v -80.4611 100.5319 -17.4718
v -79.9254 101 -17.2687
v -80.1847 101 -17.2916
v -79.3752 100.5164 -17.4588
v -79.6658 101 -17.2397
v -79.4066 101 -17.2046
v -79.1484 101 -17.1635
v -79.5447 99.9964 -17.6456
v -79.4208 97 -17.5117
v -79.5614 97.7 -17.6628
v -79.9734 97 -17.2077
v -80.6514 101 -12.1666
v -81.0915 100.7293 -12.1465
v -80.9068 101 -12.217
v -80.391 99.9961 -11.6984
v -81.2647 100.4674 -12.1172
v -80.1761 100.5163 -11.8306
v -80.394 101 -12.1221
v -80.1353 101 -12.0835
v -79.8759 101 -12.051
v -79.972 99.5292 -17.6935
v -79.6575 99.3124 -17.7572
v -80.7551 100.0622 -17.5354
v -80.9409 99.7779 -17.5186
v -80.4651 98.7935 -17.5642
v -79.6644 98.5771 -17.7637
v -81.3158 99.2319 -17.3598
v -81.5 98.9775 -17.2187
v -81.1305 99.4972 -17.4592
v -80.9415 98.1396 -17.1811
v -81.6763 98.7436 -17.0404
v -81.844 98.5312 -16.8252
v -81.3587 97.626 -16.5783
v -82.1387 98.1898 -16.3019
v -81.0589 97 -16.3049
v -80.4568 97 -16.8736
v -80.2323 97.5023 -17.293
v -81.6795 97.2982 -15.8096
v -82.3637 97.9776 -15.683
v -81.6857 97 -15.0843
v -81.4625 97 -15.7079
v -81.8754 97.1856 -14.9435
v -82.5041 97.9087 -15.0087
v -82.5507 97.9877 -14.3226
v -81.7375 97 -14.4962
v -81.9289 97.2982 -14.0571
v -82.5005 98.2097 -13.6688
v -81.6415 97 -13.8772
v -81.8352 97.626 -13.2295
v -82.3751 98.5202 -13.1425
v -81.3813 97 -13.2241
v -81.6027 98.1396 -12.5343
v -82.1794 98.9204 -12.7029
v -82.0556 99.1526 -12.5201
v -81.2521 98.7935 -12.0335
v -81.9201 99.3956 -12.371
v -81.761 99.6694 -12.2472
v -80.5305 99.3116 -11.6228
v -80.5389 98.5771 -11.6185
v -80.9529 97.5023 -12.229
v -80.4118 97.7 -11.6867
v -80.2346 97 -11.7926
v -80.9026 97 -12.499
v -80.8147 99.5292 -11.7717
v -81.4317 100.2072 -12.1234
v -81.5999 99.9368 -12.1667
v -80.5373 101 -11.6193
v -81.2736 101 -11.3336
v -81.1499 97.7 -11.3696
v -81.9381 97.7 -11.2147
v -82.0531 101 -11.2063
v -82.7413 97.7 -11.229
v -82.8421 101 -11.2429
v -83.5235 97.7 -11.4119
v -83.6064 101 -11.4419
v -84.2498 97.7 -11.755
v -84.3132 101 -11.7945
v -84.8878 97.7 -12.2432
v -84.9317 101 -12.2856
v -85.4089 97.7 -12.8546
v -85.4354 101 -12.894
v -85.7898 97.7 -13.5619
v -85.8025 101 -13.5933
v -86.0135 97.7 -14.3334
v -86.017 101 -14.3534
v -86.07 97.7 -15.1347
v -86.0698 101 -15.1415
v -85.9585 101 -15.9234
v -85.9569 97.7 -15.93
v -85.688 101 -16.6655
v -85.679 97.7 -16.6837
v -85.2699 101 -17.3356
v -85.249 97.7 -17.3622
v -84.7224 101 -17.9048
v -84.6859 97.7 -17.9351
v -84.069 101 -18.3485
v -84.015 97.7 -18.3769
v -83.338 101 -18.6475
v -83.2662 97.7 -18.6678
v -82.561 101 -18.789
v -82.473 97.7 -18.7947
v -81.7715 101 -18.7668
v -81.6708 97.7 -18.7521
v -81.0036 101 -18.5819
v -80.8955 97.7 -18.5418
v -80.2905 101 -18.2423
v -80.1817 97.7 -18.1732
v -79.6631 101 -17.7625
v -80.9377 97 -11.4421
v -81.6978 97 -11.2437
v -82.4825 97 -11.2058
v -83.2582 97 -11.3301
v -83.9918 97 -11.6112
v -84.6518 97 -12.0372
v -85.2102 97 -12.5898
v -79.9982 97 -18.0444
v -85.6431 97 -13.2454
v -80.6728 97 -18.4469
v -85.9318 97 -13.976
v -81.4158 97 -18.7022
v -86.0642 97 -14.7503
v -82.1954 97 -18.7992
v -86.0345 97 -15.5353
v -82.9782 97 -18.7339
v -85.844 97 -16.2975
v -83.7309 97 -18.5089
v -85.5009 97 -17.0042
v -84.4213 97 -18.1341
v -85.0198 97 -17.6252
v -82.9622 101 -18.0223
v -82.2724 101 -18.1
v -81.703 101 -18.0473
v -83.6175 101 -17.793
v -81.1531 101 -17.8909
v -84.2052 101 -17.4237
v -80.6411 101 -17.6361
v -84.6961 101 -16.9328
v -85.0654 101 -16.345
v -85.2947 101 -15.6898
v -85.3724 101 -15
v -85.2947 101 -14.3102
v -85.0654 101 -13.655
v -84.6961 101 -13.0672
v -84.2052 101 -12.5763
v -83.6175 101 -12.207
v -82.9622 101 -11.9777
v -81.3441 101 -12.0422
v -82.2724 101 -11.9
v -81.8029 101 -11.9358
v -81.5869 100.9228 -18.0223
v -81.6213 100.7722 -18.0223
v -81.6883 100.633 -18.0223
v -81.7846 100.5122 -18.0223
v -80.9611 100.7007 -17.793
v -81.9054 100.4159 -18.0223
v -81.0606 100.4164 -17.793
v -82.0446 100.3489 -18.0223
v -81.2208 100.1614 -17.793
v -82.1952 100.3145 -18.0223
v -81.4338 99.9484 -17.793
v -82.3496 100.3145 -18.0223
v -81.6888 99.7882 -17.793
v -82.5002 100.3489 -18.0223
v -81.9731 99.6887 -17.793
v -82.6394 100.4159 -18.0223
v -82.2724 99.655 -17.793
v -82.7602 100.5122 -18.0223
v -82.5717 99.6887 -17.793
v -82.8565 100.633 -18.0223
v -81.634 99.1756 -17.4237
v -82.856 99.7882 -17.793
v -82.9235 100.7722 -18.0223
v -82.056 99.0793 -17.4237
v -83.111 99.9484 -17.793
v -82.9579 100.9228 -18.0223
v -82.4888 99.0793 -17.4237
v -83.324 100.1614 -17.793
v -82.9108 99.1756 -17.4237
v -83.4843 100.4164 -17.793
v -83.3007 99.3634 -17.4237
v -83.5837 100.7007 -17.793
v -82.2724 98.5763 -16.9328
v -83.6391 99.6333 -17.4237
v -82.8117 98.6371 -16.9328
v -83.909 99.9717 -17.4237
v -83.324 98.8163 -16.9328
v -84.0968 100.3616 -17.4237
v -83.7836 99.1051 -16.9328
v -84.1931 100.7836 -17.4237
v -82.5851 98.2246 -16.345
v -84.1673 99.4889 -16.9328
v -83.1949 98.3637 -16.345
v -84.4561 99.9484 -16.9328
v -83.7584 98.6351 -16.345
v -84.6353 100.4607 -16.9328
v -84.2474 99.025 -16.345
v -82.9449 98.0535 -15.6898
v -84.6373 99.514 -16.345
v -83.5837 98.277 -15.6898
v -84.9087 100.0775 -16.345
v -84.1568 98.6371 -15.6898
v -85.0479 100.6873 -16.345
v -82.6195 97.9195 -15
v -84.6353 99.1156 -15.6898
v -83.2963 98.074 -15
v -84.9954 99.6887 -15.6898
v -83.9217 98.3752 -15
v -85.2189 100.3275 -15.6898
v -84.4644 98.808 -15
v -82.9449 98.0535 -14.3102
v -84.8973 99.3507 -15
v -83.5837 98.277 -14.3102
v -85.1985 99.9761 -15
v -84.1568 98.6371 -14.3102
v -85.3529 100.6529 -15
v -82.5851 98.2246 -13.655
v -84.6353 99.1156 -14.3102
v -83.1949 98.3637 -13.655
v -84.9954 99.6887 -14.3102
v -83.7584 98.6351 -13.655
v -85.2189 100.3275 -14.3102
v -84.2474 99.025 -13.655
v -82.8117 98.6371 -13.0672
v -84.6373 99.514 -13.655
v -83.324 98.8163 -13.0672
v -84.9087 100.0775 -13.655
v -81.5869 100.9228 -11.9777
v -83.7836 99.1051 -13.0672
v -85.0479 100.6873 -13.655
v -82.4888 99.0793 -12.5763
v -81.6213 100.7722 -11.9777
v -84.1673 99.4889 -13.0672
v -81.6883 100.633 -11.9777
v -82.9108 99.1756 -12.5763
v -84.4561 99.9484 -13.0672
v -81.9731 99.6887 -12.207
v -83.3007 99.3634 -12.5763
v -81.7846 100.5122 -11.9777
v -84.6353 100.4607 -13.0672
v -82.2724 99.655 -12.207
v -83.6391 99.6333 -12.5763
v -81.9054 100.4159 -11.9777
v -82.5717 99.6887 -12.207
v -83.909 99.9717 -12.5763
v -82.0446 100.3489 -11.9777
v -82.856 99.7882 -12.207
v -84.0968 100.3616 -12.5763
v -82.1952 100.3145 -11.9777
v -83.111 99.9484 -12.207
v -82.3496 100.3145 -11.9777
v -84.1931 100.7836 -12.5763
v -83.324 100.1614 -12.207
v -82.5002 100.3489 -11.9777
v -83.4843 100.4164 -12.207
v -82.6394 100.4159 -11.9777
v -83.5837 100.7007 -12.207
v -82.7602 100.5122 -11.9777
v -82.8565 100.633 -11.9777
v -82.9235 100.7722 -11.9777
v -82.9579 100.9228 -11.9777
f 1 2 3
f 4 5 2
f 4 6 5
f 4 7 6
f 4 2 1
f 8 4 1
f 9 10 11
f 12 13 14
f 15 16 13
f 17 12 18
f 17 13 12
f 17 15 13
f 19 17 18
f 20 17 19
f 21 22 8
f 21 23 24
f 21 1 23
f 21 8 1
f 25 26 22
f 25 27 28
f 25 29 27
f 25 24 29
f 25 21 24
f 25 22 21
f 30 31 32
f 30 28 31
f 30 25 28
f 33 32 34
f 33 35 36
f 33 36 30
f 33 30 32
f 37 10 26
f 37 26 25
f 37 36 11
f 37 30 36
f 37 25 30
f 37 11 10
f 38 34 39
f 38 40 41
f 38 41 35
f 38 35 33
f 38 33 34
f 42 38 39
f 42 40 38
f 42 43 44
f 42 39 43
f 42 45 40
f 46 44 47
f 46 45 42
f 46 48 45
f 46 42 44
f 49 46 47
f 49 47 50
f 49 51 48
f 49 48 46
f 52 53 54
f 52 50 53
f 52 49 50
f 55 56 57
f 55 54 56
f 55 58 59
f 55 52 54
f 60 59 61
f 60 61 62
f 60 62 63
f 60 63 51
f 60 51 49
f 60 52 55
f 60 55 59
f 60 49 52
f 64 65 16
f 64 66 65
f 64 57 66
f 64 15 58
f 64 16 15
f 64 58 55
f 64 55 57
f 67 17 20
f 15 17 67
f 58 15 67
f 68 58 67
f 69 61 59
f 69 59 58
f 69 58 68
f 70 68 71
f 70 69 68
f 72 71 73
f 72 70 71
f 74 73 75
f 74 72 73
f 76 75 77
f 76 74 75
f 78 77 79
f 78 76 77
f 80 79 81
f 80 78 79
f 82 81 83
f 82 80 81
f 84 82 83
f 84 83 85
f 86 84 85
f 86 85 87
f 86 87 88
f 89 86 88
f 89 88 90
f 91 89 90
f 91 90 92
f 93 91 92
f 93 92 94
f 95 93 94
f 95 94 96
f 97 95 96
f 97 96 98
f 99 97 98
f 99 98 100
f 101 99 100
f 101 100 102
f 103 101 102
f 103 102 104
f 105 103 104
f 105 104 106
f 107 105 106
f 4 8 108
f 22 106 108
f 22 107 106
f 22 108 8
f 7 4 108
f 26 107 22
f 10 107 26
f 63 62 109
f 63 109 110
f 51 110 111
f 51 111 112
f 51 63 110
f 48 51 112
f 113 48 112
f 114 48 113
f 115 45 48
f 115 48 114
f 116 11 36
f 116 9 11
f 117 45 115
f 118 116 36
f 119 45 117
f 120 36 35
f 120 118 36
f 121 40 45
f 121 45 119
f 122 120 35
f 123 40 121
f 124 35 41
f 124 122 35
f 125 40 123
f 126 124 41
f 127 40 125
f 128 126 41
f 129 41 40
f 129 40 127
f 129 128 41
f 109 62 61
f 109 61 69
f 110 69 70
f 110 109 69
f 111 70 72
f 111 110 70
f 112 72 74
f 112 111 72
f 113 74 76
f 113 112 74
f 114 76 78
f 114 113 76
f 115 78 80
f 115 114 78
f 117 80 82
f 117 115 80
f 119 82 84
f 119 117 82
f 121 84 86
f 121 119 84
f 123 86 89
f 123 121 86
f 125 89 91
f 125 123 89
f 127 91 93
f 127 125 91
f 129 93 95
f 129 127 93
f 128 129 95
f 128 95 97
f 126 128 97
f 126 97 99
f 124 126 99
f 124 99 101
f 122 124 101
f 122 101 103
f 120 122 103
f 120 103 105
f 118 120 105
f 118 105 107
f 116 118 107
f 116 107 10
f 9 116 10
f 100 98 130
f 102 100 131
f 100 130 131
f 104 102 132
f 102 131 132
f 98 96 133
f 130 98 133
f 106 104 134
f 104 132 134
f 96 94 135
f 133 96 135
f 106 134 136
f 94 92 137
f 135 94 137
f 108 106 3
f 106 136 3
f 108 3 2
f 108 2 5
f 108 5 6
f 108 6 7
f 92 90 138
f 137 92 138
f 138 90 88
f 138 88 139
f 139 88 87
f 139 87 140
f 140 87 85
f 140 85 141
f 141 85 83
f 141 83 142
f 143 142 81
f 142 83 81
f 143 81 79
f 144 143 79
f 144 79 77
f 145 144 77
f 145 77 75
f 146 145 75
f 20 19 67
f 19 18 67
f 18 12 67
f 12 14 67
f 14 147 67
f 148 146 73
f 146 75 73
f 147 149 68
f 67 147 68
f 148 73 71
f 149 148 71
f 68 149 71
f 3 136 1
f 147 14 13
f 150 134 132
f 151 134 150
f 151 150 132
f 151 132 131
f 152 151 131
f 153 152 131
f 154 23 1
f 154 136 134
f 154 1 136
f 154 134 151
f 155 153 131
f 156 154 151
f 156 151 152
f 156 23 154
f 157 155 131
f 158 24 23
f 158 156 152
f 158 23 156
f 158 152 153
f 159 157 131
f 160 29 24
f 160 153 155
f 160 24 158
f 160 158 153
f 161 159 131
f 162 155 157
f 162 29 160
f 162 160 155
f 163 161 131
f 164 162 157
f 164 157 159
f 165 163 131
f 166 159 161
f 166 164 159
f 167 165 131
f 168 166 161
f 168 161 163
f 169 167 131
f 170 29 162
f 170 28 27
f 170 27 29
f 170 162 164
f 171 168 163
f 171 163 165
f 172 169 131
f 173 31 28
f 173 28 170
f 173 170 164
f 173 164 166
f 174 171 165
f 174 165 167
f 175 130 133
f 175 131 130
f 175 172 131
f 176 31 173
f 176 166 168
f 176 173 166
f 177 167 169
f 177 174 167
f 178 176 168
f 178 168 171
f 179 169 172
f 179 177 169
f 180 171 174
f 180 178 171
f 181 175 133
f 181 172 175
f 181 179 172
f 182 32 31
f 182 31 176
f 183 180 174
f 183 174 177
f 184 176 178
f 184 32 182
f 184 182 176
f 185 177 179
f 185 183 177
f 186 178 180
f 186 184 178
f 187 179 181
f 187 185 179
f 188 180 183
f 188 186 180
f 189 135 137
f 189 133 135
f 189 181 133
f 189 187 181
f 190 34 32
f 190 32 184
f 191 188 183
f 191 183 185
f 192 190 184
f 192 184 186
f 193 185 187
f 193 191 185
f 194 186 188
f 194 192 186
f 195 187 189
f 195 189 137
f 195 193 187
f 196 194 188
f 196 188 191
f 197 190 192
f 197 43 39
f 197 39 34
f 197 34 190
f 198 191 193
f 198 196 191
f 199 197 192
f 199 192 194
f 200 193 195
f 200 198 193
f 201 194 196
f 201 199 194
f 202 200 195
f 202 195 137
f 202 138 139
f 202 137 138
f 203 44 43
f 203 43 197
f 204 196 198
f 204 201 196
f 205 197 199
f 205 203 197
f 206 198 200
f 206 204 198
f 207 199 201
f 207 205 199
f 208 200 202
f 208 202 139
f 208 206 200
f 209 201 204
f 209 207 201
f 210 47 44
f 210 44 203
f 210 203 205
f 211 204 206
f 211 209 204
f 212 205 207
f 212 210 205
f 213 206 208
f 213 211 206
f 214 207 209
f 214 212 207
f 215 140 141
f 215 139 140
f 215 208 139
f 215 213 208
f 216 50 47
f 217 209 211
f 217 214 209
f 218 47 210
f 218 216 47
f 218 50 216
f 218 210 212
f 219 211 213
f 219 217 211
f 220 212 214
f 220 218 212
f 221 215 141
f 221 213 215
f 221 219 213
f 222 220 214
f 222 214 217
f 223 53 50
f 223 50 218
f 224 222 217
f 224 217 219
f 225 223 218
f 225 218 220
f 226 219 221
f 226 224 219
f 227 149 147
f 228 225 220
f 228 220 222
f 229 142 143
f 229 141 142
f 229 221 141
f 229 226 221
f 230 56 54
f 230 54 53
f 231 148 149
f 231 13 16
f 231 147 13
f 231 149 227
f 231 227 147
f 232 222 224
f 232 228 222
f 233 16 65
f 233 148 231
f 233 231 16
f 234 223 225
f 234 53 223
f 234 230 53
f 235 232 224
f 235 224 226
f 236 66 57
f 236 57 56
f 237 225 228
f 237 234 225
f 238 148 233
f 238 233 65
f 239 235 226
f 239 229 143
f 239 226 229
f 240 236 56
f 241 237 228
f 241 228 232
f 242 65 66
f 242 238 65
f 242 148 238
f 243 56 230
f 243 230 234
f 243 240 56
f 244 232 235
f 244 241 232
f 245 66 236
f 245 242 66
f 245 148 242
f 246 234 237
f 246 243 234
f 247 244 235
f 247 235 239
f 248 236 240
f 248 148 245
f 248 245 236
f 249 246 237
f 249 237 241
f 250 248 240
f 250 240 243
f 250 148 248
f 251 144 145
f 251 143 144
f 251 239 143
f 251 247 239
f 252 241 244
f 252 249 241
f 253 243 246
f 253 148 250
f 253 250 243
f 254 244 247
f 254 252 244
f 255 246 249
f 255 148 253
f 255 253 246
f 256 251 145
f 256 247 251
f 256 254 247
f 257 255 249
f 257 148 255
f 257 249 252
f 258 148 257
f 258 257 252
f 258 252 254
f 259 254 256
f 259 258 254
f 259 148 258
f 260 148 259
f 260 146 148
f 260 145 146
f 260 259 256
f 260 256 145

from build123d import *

# Parameters (mm, degrees)
KEYED_BACK_DEPTH   = 0.7
CUP_BLANK_SKETCH_R = 3.8
CUP_BLANK_DEPTH    = 3.3


with BuildPart() as part:
    # Keyed Back Sketch → Keyed Back (new body)
    with BuildSketch(Plane(origin=(0, -97, 0), x_dir=(-1, 0, 0), z_dir=(0, -1, 0))):
        with BuildLine():
            Line((79.27241336, 17.332380758), (79.27241336, 12.667619242))
            ThreePointArc((79.27241336, 12.667619242), (86.07241336, 15), (79.27241336, 17.332380758))
        make_face()
    extrude(amount=KEYED_BACK_DEPTH)

    # Cup Blank Sketch → Cup Blank (add)
    with BuildSketch(Plane(origin=(0, -97.7, 0), x_dir=(-1, 0, 0), z_dir=(0, -1, 0))):
        with Locations(Location((82.27241336, 15, 0), (0, 0, 217.863646362))):
            Circle(CUP_BLANK_SKETCH_R)
    extrude(amount=CUP_BLANK_DEPTH)

    # Spherical Bearing Seat profile → Spherical Bearing Seat (revolve, cut)
    with BuildSketch(Plane(origin=(0, -101, 0), x_dir=(-1, 0, 0), z_dir=(0, -1, 0))):
        with BuildLine():
            Line((82.27241336, 11.9), (82.27241336, 18.1))
            ThreePointArc((82.27241336, 18.1), (79.17241336, 15), (82.27241336, 11.9))
        make_face()
    revolve(axis=Axis((-82.27241336, -101, -25), (0, 0, 1)), mode=Mode.SUBTRACT)

    # Articulation Throat Sketch → Articulation Throat (revolve, cut)
    with BuildSketch(Plane(origin=(21.848129609, -32.292361412, -7.122138515), x_dir=(-0.8343429620590533, -0.5383086561091639, -0.11872494439026368), z_dir=(0.551245699903886, -0.8147619813060819, -0.17969722356136375))):
        Polygon((124.793457491, -7.104979762), (124.793457491, -4.804979762), (101.793457491, 1.915020238), (101.793457491, -7.104979762), align=None)
    revolve(axis=Axis((-90.61584298, -106.383086561, -16.187249444), (0.8343429620590537, 0.5383086561091633, 0.11872494439026321)), mode=Mode.SUBTRACT)


with BuildPart() as body_2:
    # Mirror1: mirrored copy
    add(part.part.mirror(Plane(origin=(0, 0, 0), x_dir=(0, 0, 1), z_dir=(0, -1, 0))))


solid = body_2.part
